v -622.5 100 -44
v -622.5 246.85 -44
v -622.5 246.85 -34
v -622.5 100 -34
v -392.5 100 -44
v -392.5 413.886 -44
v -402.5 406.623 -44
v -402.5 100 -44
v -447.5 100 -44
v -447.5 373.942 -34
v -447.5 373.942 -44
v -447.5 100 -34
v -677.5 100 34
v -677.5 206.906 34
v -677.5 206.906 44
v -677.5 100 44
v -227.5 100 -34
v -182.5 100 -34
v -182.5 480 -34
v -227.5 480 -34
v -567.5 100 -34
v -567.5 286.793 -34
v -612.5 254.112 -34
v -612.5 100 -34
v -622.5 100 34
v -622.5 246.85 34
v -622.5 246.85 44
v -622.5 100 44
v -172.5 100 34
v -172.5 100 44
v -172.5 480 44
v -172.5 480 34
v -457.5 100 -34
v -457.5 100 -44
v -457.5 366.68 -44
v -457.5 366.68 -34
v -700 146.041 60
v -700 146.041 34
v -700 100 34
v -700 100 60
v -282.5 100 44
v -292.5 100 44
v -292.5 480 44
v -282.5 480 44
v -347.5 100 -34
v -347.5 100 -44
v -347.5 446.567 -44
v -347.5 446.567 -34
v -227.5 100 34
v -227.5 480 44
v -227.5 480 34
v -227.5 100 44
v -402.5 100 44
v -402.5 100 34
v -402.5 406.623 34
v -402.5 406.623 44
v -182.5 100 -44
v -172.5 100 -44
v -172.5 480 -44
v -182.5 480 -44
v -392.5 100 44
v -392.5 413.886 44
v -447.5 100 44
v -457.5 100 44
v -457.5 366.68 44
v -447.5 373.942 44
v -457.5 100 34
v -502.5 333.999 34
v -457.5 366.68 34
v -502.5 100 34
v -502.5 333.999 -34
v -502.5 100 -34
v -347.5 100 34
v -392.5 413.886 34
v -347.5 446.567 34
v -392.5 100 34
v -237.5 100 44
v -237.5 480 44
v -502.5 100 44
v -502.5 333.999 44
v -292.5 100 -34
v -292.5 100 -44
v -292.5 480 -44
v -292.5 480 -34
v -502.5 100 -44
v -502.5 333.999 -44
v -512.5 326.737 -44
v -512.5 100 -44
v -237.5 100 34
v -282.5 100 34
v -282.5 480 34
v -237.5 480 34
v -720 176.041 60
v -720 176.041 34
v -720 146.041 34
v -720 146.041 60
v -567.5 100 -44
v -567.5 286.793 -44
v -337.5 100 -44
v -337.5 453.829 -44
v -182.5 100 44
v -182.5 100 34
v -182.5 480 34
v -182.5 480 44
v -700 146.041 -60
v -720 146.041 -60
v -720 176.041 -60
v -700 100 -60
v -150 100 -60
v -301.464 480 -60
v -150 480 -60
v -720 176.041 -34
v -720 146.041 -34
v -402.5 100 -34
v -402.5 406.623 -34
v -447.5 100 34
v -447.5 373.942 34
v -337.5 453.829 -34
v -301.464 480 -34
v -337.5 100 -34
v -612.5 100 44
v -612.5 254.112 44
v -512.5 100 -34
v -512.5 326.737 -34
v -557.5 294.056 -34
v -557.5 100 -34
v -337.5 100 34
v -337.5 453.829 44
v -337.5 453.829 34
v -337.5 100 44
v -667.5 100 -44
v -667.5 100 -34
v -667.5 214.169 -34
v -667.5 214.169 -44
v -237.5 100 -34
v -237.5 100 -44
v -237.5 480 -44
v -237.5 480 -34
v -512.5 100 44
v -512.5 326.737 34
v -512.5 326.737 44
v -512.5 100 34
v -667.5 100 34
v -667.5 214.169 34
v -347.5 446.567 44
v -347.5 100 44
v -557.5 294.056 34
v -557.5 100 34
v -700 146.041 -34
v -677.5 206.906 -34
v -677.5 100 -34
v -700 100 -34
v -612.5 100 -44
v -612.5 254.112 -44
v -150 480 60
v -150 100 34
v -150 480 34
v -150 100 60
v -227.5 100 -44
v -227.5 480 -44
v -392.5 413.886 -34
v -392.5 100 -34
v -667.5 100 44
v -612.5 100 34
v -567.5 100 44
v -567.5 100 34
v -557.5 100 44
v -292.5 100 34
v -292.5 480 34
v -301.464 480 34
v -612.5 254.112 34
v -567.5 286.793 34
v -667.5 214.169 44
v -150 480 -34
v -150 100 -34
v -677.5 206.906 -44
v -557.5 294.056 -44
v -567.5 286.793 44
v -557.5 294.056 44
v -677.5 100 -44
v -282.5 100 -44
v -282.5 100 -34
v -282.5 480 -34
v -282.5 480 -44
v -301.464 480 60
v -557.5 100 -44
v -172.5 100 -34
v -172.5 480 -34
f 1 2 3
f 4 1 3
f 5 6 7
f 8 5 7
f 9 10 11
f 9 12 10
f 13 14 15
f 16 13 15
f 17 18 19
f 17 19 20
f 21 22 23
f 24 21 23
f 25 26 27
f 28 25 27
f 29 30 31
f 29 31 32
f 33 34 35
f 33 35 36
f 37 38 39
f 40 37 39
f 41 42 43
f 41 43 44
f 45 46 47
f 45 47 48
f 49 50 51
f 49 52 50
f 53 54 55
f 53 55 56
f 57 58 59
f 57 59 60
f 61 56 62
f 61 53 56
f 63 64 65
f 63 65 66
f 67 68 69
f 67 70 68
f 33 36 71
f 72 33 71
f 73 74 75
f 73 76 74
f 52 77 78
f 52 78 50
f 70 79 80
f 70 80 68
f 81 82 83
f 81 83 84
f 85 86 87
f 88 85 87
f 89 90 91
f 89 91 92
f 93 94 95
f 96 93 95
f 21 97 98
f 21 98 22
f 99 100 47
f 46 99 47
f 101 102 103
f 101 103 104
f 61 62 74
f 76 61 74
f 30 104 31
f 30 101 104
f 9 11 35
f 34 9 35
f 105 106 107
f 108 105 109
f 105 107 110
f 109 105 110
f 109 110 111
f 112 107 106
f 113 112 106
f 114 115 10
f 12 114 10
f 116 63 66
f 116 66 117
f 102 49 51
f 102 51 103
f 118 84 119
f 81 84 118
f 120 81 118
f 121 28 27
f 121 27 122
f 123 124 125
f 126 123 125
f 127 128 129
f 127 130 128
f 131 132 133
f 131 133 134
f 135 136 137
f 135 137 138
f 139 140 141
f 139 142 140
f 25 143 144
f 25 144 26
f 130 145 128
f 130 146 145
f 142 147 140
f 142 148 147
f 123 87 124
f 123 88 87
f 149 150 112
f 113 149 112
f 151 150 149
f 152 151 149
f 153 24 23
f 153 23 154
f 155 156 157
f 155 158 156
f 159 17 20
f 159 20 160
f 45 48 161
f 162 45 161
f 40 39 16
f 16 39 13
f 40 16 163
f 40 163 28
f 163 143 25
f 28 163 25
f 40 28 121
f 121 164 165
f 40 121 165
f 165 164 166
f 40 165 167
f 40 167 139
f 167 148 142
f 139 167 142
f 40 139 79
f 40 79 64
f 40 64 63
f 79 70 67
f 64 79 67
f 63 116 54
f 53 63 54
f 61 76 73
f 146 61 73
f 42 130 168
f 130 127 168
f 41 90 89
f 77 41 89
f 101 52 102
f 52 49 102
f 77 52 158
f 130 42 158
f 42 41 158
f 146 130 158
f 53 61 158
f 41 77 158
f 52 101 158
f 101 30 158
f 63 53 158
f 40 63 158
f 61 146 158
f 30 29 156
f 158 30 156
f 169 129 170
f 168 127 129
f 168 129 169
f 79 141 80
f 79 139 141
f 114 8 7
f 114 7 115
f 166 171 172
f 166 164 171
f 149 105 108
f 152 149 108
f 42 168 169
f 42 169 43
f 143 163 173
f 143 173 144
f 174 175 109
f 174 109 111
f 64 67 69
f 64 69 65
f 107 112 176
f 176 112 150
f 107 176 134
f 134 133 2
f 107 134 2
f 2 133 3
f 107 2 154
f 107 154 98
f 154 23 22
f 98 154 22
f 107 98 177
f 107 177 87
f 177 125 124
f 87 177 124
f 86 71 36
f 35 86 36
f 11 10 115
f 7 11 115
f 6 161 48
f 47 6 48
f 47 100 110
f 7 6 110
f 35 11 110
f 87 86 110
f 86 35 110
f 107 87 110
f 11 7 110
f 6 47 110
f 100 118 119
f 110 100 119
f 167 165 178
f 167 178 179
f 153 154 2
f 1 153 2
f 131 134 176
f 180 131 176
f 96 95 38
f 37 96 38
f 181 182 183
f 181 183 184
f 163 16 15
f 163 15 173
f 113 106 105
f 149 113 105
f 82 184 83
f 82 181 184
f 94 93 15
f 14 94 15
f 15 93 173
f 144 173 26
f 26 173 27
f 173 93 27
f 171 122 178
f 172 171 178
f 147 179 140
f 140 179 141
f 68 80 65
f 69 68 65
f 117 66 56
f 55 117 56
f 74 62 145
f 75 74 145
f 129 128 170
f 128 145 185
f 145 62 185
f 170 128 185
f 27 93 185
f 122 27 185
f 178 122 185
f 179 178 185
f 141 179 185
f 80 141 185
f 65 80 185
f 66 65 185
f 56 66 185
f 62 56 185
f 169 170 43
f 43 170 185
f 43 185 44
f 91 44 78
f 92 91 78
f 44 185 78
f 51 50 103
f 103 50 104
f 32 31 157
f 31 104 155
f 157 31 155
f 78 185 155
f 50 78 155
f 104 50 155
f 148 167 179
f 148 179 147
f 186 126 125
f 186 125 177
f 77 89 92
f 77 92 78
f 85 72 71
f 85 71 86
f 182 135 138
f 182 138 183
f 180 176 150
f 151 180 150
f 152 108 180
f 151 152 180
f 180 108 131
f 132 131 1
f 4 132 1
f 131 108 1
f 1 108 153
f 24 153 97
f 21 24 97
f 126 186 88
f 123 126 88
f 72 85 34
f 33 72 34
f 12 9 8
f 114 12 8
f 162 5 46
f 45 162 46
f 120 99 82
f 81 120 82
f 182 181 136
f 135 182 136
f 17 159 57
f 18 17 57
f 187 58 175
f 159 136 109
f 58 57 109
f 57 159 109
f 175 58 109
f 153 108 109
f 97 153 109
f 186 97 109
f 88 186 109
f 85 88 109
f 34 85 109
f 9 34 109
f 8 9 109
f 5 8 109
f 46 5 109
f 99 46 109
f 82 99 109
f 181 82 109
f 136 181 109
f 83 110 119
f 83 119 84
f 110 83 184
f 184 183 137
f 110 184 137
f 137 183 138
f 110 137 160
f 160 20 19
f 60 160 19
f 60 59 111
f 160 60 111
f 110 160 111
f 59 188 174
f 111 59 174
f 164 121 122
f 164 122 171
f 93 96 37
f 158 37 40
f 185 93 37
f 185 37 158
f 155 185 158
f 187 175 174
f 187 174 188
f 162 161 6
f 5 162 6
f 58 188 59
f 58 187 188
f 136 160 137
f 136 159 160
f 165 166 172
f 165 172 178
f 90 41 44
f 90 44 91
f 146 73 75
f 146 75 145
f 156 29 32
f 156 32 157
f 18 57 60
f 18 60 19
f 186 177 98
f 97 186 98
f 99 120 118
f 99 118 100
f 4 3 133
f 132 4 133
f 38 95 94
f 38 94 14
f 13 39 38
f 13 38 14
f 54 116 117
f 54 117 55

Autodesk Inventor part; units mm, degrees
ref_plane "YZ Plane" through (0, 0, 0) normal (1, 0, 0) x (0, 1, 0)
ref_plane "XZ Plane" through (0, 0, 0) normal (0, 1, 0) x (-1, 0, 0)
ref_plane "XY Plane" through (0, 0, 0) normal (0, 0, 1) x (1, 0, 0)
sketch "草圖1" plane through (0, 0, 0) normal (0, 0, 1) x (1, 0, 0)
  line L0 (0, 0) -> (0, 800)
  line L1 (0, 800) -> (-150, 800)
  line L2 (-150, 800) -> (-720, 176.041)
  line L3 (-700, 100) -> (-150, 100)
  line L4 (-150, 100) -> (-150, 0)
  line L5 (-150, 0) -> (0, 0)
  line L6 (-720, 176.041) -> (-720, 146.041)
  line L7 (-720, 146.041) -> (-700, 146.041)
  line L8 (-700, 146.041) -> (-700, 100)
  dimension "d0" = 150
  dimension "d1" = 150
  dimension "d3" = 800
  dimension "d4" = 100
  dimension "d5" = 720
  dimension "d6" = 20
  dimension "d8" = 30
  dimension "d9" = 146.041
extrude "擠出1" add sketch "草圖1" along normal mid plane 120
sketch "草圖2" plane through (-700, 100, 60) normal (0, -1, 0) x (1, 0, 0)
  line L0 (700, -120) -> (550, -120) construction
  line L1 (550, -120) -> (0, -120) construction
  line L2 (0, -120) -> (0, 0) construction
  line L3 (0, 0) -> (550, 0) construction
  line L4 (550, 0) -> (700, 0) construction
  line L5 (700, 0) -> (700, -120) construction
  line L6 (550, -120) -> (550, 0) construction
  line L7 (-108.104, -26) -> (550, -26)
  line L8 (550, -26) -> (550, -94)
  line L9 (550, -94) -> (-108.104, -94)
  line L10 (-108.104, -94) -> (-108.104, -26)
  point P0 (700, -60)
  point P1 (550, -60)
  dimension "d12" = 68
extrude "擠出2" cut sketch "草圖2" against normal through all
sketch "草圖3" plane through (-150, 0, 60) normal (-1, 0, 0) x (0, 0, 1)
  line L0 (-26, 100) -> (-26, 800) projected
  line L1 (-26, 800) -> (0, 800) projected
  line L2 (0, 800) -> (0, 100) projected
  line L3 (0, 100) -> (-26, 100) projected
  line L4 (-94, 800) -> (-26, 800) projected
  line L5 (-120, 800) -> (-94, 800) projected
  line L6 (-120, 100) -> (-120, 800) projected
  line L7 (-94, 100) -> (-120, 100) projected
  line L8 (-94, 800) -> (-94, 100) projected
  line L9 (0, 100) -> (0, 0) projected
  line L10 (0, 0) -> (-120, 0) projected
  line L11 (-120, 0) -> (-120, 100) projected
  circle A0 centre (-60, 50) radius 10
  point P0 (-60, 0)
  point P1 (-60, 0)
  dimension "d15" = 50
  dimension "d16" = 20
extrude "擠出3" cut sketch "草圖3" against normal through all contours A0
sketch "草圖4" plane through (-700, 100, 60) normal (0, -1, 0) x (1, 0, 0)
  line L0 (700, -120) -> (550, -120) construction
  line L1 (550, -120) -> (0, -120) construction
  line L2 (0, -120) -> (0, -94) construction
  line L3 (0, -94) -> (550, -94) construction
  line L4 (550, -94) -> (550, -26) construction
  line L5 (550, -26) -> (0, -26) construction
  line L6 (0, -26) -> (0, 0) construction
  line L7 (0, 0) -> (550, 0) construction
  line L8 (550, 0) -> (700, 0) construction
  line L9 (700, 0) -> (700, -120) construction
  line L10 (550, -120) -> (550, -94) construction
  line L11 (550, -26) -> (550, 0) construction
  line L12 (22.5, -16) -> (32.5, -16)
  line L13 (32.5, -16) -> (32.5, -104)
  line L14 (32.5, -104) -> (22.5, -104)
  line L15 (22.5, -104) -> (22.5, -16)
  line L16 (0.5, 0) -> (54.5, 0) construction
  line L17 (54.5, 0) -> (54.5, -120) construction
  line L18 (54.5, -120) -> (0.5, -120) construction
  line L19 (0.5, -120) -> (0.5, 0) construction
  point P0 (700, -60)
  point P1 (27.5, -16)
  point P2 (27.5, 0)
  dimension "d21" = 0.5
  dimension "d22" = 54
  dimension "d23" = 10
  dimension "d24" = 10
  dimension "d25" = 10
extrude "擠出4" cut sketch "草圖4" against normal blind 911.5
pattern_linear "矩形陣列1" count 10 spacing 55 along (1, 0, 0) of "擠出4"
sketch "草圖5" plane through (0, 0, 60) normal (0, 0, 1) x (1, 0, 0)
  line L0 (0, 800) -> (0, 0) projected
  line L1 (0, 0) -> (-150, 0) projected
  line L2 (-150, 0) -> (-150, 100) projected
  line L3 (-150, 100) -> (-700, 100) projected
  line L4 (-700, 100) -> (-700, 146.041) projected
  line L5 (-700, 146.041) -> (-720, 146.041) projected
  line L6 (-720, 146.041) -> (-720, 176.041) projected
  line L7 (-720, 176.041) -> (-150, 800) projected
  line L8 (-150, 800) -> (0, 800) projected
  line L9 (-150, 100) -> (-150, 800) projected
  line L10 (-150, 100) -> (-150, 800)
extrude "擠出5" cut sketch "草圖5" against normal through all contours L0 L1 L2 L9 L8
sketch "草圖6" plane through (0, 0, 60) normal (0, 0, 1) x (1, 0, 0)
  line L0 (-150, 800) -> (-150, 100) projected
  line L1 (-150, 100) -> (-700, 100) projected
  line L2 (-700, 100) -> (-700, 146.041) projected
  line L3 (-700, 146.041) -> (-720, 146.041) projected
  line L4 (-720, 146.041) -> (-720, 176.041) projected
  line L5 (-720, 176.041) -> (-150, 800) projected
  line L6 (-720, 176.041) -> (-150, 590)
  line L7 (-150, 100) -> (-150, 800) projected
  point P0 (0, 0)
  point P1 (-150, 590)
  dimension "d33" = 210
extrude "擠出6" cut sketch "草圖6" against normal through all contours L0 L6 L5
sketch "草圖7" plane through (0, 0, 60) normal (0, 0, 1) x (1, 0, 0)
  line L0 (-720, 146.041) -> (-720, 176.041) projected
  line L1 (-720, 176.041) -> (-150, 590) projected
  line L2 (-150, 590) -> (-150, 100) projected
  line L3 (-150, 100) -> (-700, 100) projected
  line L4 (-700, 100) -> (-700, 146.041) projected
  line L5 (-700, 146.041) -> (-720, 146.041) projected
  line L6 (-301.4643, 480) -> (-150, 480)
  point P0 (0, 0)
  dimension "d36" = 380
extrude "擠出7" cut sketch "草圖7" against normal through all contours L1 L2 L6
properties part number "Rising agency"
